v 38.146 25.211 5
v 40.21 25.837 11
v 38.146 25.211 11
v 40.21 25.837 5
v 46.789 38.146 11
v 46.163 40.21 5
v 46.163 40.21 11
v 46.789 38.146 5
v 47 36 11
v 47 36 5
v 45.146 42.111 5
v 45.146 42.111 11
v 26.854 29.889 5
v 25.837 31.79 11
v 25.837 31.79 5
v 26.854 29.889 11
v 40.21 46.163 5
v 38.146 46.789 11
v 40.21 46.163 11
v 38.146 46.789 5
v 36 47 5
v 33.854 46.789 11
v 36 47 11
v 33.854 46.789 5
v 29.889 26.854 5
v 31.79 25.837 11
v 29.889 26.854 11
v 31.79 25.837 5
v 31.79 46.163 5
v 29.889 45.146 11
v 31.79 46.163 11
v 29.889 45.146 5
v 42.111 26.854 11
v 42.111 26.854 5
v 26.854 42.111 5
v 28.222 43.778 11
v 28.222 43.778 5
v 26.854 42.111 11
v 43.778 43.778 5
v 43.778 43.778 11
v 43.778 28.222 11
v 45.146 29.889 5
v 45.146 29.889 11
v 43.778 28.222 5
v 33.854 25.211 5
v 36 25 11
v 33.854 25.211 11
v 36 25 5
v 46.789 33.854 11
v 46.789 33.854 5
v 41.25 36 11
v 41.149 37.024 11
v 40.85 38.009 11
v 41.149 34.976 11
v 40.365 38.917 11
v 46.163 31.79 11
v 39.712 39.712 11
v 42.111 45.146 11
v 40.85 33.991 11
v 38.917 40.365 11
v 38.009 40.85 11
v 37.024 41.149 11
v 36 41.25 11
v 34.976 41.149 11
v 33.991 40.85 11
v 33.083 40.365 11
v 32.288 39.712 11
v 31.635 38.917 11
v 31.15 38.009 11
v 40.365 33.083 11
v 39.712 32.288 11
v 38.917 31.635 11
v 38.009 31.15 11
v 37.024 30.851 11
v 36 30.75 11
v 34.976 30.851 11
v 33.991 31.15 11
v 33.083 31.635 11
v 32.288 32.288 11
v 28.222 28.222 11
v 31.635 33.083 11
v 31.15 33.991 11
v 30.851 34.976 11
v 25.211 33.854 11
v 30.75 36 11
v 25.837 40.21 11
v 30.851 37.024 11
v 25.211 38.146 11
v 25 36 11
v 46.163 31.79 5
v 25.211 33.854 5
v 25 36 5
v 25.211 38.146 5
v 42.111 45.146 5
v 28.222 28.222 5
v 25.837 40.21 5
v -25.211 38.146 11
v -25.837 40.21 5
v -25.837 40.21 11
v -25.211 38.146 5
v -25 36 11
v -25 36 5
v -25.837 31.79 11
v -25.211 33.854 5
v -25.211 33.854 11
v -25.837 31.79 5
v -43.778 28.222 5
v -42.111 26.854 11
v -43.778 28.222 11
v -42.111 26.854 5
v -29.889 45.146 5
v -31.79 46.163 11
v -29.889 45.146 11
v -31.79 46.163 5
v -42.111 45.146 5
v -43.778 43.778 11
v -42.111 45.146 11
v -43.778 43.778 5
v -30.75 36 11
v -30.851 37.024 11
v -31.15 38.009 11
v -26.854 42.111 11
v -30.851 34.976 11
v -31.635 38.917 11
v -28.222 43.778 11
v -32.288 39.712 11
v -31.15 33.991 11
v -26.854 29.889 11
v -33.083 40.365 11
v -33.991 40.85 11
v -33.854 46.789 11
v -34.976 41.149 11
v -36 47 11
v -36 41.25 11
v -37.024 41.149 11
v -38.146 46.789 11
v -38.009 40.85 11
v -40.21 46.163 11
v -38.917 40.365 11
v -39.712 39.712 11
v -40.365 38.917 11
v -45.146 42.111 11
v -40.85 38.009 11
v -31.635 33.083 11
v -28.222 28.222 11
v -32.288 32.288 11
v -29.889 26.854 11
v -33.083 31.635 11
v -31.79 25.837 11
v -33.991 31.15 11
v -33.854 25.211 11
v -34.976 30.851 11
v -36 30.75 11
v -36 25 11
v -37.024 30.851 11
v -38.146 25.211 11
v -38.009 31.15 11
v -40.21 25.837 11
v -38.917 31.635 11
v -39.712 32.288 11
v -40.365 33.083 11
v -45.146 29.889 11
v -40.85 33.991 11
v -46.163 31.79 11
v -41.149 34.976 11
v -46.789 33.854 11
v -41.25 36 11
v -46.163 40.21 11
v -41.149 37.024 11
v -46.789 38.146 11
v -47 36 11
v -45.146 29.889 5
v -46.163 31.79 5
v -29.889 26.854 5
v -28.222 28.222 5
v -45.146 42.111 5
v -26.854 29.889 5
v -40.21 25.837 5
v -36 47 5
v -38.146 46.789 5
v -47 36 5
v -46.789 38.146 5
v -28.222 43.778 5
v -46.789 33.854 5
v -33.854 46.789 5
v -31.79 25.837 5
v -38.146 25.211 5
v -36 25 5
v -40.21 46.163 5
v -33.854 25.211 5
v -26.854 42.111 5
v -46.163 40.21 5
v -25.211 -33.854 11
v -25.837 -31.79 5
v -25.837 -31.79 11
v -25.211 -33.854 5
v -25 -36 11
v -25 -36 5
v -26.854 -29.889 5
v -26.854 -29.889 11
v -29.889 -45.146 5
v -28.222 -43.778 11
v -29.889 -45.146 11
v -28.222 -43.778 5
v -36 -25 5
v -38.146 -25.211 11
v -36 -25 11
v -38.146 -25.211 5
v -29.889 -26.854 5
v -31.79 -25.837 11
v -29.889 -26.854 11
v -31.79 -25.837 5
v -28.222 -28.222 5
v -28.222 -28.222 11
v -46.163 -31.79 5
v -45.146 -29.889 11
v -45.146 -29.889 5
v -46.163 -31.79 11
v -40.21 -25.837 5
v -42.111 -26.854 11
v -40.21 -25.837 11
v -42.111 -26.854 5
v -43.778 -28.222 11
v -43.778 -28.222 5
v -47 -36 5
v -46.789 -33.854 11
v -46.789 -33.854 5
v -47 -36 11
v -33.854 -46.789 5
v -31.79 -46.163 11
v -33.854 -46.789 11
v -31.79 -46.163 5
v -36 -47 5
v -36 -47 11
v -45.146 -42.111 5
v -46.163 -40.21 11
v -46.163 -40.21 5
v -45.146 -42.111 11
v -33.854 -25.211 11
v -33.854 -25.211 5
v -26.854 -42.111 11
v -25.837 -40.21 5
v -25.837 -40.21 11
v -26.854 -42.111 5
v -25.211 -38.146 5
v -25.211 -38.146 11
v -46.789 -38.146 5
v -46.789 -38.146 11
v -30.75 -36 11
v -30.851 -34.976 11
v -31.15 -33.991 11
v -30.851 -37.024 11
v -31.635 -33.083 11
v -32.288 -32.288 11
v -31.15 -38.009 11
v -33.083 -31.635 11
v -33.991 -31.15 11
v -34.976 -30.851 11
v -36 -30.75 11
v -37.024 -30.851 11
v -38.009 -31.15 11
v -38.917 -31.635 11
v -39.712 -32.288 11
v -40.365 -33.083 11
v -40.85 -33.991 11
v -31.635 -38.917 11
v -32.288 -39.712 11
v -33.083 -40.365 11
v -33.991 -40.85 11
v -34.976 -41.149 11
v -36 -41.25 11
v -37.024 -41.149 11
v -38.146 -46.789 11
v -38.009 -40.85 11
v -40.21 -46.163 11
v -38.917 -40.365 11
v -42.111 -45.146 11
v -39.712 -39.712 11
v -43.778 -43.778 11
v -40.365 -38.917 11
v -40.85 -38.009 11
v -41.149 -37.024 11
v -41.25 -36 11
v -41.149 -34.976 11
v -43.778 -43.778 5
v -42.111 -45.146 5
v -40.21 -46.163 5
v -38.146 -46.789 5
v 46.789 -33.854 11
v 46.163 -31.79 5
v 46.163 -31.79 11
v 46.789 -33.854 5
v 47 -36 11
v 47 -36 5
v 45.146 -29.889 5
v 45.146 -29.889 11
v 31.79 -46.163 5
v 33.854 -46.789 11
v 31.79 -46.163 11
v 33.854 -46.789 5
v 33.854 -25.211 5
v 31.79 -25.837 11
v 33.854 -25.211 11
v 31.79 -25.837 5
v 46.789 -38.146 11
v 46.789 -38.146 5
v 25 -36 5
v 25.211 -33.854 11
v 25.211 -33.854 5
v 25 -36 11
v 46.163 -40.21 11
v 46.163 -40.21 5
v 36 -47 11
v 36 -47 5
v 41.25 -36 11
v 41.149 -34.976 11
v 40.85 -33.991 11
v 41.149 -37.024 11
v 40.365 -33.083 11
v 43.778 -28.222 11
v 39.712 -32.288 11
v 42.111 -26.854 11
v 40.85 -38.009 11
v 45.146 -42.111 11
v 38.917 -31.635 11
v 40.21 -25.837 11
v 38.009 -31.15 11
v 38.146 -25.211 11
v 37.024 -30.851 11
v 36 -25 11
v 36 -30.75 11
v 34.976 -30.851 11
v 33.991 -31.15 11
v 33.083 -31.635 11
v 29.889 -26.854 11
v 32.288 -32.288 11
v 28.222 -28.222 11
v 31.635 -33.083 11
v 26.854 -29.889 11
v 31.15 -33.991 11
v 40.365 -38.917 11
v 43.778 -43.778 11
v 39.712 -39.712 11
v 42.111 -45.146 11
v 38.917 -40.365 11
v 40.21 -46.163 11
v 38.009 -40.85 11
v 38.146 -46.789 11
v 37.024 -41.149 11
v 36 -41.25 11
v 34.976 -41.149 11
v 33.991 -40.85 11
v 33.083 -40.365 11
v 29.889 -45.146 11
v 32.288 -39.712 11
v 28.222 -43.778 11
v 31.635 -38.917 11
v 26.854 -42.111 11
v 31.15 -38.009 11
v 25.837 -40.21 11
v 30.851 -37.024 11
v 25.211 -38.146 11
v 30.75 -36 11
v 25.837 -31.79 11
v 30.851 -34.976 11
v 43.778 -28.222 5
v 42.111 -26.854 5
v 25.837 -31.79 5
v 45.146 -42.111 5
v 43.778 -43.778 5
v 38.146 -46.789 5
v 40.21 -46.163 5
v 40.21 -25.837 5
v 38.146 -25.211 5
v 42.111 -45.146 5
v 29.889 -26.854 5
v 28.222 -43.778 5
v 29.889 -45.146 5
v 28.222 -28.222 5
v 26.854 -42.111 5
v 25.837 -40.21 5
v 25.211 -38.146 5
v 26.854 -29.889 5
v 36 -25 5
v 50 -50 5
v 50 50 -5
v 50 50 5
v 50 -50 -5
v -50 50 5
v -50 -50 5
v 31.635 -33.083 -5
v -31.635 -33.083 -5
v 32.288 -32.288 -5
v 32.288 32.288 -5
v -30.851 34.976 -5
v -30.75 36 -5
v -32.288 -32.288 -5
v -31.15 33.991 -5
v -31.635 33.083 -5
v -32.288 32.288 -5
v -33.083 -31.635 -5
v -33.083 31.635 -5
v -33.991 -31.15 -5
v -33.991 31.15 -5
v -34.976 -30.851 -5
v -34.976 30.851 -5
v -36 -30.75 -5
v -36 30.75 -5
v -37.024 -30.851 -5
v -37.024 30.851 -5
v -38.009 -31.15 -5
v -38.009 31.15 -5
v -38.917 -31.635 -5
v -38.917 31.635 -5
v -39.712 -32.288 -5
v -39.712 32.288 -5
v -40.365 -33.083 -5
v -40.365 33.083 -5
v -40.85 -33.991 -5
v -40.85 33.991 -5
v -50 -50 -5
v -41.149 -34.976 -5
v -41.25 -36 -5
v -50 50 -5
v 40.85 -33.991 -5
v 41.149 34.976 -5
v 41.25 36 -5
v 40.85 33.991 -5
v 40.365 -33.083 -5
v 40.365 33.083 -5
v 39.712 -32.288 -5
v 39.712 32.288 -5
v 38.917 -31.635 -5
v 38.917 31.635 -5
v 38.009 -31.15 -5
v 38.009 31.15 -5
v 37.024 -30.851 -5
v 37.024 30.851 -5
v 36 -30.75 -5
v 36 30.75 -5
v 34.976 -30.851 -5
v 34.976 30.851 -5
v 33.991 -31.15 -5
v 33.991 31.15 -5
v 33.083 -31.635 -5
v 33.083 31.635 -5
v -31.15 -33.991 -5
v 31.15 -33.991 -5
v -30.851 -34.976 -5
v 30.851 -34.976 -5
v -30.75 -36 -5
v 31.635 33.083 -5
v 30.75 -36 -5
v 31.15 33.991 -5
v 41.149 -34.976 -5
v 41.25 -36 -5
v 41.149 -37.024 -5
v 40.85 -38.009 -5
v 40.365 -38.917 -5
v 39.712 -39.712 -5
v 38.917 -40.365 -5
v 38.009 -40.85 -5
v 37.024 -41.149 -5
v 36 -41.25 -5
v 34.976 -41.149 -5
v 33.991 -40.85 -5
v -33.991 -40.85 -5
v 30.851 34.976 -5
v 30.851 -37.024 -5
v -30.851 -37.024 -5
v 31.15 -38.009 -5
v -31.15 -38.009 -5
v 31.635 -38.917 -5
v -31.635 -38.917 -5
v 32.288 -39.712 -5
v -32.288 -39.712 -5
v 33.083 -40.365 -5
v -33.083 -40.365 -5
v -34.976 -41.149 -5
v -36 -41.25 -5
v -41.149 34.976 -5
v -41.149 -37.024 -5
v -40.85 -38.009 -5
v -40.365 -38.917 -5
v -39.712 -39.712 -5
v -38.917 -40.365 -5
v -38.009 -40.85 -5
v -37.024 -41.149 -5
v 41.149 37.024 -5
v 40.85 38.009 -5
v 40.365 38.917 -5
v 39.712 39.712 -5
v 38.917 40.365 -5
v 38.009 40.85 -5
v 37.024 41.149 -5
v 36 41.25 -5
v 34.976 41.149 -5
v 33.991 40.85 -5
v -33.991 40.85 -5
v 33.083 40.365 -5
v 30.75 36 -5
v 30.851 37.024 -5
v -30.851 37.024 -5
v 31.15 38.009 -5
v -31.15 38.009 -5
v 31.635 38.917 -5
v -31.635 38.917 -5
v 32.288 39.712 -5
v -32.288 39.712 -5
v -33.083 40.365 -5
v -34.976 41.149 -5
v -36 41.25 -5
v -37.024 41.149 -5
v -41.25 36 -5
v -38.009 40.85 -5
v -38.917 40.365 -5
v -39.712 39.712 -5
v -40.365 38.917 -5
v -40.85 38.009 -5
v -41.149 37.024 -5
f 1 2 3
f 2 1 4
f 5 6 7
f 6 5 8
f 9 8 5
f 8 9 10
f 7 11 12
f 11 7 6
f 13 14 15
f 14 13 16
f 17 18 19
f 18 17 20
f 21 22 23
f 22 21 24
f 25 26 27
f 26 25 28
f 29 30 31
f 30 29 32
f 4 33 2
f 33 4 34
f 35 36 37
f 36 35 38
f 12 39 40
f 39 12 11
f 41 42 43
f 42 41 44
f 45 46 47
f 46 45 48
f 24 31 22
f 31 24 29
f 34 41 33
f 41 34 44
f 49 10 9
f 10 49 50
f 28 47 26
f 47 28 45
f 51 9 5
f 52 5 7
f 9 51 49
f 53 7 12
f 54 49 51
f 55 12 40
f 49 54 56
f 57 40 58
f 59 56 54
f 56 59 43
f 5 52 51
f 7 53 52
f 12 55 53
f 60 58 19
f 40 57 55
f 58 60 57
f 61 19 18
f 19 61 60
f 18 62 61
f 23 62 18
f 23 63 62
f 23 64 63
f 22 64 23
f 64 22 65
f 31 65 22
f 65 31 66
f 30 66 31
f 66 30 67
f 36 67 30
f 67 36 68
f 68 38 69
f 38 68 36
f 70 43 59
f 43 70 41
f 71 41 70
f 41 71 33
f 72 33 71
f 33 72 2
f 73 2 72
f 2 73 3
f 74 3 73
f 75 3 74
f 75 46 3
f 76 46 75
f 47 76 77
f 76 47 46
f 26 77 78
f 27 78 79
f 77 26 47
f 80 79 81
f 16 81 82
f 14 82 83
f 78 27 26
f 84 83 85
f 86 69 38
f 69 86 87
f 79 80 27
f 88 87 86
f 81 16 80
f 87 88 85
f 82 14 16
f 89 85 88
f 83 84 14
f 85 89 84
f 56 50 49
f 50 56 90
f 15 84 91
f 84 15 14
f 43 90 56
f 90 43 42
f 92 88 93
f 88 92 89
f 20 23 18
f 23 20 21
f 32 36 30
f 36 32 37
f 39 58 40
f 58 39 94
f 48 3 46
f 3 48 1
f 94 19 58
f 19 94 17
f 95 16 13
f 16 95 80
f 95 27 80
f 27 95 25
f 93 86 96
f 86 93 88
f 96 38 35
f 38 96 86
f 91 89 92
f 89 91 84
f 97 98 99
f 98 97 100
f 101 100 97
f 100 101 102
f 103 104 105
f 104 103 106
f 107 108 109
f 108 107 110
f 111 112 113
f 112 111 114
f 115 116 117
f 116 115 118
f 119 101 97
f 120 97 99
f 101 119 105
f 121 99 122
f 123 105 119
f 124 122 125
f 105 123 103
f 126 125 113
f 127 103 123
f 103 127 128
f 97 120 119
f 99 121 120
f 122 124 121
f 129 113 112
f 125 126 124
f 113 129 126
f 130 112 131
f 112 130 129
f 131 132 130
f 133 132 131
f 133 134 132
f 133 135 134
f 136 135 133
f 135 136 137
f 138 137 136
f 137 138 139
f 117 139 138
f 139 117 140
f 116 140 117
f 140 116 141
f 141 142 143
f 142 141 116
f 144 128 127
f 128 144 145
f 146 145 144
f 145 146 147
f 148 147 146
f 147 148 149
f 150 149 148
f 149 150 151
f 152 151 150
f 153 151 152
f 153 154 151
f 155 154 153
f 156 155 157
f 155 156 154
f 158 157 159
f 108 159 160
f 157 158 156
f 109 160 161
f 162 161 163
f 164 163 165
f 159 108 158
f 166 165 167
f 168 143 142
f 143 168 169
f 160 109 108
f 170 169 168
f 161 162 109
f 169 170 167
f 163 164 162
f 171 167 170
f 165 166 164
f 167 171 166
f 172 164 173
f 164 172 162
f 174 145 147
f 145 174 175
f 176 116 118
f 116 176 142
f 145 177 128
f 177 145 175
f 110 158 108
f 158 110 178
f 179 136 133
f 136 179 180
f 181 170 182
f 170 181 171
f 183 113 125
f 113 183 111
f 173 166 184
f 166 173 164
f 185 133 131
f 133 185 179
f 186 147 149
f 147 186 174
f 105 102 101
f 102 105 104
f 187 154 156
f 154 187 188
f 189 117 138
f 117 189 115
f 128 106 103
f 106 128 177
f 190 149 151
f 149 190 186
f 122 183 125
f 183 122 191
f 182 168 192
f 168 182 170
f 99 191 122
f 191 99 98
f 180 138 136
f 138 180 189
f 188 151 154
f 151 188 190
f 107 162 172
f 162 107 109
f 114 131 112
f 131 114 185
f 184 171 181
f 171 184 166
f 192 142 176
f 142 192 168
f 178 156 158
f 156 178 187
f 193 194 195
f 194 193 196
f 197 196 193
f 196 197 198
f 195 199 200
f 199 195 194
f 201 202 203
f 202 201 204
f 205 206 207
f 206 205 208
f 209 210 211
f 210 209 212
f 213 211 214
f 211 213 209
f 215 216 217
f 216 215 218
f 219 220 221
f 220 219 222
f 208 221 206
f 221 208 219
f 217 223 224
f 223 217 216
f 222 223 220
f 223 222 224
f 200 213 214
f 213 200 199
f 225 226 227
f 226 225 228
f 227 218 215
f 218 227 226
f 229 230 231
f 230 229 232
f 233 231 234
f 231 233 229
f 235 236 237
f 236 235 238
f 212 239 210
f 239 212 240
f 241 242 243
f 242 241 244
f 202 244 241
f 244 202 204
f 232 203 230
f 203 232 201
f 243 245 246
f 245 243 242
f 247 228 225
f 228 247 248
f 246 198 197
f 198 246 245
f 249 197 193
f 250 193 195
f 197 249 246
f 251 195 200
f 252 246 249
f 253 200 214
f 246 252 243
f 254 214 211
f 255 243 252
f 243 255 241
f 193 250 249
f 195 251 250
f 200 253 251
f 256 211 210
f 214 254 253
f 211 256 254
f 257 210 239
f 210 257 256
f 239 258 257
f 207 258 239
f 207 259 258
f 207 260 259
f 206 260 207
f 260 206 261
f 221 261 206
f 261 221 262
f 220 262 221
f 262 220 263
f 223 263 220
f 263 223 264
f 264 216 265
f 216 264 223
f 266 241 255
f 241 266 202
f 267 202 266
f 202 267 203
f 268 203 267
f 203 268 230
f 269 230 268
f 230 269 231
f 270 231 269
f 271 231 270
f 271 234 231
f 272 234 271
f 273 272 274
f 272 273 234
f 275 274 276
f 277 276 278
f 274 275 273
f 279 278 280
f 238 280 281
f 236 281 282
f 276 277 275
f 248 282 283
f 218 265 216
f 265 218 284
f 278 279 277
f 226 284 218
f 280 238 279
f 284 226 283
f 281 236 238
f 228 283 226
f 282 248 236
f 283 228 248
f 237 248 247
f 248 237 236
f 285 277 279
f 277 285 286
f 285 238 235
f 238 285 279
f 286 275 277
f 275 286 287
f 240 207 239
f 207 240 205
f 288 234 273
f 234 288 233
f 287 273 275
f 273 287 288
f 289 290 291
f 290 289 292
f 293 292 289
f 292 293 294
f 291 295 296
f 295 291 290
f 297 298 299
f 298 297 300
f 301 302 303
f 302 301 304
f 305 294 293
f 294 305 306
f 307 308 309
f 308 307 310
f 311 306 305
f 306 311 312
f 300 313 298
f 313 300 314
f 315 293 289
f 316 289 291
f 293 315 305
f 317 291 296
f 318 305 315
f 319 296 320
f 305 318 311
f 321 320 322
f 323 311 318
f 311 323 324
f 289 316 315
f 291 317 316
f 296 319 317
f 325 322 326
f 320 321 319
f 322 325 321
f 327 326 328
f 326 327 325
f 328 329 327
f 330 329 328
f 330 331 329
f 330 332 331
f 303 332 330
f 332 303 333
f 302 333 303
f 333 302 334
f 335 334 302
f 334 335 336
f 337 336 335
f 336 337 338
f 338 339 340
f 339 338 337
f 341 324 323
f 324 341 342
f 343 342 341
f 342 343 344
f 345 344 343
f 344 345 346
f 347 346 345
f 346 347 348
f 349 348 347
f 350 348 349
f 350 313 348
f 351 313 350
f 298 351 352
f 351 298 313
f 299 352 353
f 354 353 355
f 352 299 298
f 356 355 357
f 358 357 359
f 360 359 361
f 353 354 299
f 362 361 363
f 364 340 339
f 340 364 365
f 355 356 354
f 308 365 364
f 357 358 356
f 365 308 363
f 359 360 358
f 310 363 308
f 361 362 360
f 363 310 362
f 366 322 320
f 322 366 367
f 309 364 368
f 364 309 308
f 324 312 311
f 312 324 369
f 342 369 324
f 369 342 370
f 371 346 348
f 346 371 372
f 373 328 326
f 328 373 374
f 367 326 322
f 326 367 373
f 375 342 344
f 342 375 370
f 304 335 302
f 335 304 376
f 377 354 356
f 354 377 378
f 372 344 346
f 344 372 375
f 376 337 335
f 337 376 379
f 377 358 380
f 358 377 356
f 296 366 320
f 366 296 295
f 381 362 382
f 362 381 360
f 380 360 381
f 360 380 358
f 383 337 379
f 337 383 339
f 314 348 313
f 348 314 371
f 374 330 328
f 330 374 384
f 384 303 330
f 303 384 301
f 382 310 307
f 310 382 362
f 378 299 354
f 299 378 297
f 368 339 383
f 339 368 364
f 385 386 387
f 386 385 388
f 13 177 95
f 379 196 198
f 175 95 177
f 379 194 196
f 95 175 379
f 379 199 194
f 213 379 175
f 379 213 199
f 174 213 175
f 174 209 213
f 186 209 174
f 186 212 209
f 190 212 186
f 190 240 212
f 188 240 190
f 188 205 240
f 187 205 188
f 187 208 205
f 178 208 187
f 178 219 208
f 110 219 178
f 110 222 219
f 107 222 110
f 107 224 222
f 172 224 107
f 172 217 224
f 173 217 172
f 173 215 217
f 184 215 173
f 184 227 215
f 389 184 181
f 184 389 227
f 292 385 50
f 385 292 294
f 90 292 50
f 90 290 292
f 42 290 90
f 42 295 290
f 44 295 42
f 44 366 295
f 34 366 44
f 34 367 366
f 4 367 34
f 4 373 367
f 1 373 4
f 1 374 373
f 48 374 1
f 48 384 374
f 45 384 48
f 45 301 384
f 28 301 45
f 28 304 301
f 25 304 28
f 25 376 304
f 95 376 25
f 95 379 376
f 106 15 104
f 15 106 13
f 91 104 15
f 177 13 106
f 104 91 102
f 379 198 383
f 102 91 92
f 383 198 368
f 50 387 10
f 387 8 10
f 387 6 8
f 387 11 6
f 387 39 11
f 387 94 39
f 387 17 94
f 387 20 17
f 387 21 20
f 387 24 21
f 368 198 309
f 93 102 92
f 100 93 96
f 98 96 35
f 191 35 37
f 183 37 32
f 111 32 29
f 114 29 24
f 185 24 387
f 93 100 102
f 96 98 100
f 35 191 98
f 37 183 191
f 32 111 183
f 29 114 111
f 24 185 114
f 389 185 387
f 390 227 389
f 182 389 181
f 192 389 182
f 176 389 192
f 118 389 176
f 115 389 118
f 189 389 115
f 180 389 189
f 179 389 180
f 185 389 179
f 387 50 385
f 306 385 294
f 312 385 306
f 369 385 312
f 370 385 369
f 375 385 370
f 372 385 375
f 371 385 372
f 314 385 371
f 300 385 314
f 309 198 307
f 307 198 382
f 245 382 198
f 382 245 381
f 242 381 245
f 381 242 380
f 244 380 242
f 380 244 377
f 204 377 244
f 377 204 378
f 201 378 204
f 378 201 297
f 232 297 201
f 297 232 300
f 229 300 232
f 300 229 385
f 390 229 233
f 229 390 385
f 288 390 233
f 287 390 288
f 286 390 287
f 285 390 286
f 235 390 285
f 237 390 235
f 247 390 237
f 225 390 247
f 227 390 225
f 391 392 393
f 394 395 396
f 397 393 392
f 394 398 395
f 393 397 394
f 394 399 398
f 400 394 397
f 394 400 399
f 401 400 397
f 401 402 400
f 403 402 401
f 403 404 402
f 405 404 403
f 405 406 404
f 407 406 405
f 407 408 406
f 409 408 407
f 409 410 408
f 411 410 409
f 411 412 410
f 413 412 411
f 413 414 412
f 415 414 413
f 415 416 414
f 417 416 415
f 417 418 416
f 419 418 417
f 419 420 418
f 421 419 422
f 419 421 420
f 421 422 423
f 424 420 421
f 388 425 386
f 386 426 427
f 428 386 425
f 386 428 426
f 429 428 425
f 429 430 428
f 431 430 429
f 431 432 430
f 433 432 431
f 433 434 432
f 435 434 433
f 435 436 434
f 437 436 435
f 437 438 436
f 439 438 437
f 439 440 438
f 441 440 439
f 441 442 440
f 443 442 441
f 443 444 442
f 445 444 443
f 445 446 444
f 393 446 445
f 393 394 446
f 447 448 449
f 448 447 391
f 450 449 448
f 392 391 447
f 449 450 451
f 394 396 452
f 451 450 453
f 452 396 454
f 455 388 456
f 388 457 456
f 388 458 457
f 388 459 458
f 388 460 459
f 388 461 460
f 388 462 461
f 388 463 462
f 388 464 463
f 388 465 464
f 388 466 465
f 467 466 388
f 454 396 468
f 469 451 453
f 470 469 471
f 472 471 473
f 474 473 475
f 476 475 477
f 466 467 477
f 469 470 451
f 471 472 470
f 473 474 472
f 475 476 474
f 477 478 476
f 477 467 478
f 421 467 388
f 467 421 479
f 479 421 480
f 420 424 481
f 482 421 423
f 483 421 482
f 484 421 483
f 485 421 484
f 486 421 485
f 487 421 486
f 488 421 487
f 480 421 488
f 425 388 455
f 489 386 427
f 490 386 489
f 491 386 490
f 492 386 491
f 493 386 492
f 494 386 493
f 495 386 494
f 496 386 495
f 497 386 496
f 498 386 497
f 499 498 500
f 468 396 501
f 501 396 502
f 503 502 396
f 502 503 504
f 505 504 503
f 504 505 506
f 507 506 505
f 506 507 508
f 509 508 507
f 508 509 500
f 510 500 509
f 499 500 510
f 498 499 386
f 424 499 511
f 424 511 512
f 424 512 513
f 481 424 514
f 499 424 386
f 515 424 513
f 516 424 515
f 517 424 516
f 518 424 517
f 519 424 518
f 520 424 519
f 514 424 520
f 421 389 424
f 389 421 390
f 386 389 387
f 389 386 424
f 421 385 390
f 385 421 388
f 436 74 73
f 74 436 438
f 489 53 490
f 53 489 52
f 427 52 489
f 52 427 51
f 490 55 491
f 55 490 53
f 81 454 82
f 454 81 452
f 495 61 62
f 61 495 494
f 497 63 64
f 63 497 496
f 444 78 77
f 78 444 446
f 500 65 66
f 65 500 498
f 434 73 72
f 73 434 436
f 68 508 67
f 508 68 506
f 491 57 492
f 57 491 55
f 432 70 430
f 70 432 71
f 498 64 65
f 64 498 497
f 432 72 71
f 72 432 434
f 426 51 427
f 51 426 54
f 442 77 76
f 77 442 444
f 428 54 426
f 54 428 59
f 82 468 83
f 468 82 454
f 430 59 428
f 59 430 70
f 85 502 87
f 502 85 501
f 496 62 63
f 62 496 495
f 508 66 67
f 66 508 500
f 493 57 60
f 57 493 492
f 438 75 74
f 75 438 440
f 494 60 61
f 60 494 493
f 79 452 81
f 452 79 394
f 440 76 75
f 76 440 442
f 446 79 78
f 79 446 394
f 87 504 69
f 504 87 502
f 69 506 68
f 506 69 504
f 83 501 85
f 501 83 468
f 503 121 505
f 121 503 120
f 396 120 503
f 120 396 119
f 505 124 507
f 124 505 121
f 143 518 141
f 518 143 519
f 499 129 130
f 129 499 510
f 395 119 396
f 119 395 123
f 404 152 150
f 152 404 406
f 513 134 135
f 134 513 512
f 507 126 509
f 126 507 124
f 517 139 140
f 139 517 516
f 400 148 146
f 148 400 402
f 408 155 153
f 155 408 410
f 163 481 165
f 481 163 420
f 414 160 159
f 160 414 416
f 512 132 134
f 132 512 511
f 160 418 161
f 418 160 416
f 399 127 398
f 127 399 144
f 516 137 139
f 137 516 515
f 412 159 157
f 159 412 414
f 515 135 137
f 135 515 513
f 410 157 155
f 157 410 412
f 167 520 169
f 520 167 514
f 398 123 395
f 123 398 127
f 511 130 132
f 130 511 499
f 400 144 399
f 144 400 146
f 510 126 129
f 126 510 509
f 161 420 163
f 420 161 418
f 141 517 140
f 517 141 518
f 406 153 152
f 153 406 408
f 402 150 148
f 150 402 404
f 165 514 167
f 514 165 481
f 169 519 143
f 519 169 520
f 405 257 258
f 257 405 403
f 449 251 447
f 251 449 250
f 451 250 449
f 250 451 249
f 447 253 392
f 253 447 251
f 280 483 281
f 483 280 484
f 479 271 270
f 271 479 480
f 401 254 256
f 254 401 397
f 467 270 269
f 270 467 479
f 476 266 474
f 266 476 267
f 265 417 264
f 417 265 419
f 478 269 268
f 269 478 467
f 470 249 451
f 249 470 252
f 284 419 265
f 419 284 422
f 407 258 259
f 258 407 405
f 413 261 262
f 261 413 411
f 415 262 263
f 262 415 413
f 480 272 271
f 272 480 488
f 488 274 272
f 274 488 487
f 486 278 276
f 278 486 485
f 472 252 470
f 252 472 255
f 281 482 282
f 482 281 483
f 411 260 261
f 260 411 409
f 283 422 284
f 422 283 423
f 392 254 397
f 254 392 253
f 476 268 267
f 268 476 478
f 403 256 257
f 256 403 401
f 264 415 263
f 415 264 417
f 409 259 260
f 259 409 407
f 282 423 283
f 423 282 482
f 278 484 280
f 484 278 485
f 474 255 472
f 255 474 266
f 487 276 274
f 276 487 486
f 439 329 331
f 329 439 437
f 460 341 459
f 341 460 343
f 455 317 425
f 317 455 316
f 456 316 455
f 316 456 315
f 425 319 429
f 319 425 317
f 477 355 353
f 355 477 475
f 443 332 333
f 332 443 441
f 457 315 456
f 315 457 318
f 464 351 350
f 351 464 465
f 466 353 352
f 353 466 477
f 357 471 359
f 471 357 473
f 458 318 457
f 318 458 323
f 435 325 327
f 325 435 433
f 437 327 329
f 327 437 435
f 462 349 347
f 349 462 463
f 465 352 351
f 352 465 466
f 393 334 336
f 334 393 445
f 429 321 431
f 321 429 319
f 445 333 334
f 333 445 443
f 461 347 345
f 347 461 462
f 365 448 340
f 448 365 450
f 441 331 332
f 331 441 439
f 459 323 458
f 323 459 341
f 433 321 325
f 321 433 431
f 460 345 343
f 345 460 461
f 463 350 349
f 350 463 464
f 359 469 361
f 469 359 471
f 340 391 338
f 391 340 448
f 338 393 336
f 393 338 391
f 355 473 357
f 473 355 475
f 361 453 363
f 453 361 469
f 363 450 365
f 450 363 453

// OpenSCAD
$fn = 32;

// ----------------------------------------------------------------------
// Anchor pads 100 x 100 x 16
// four corner bosses with anchor holes
// ----------------------------------------------------------------------

// --- parameters (mm) ---
plate = [100, 100, 10];  // base plate size (x, y, z)
pads = 4;                // boss count, one per corner
edge = 14;               // boss centre offset from the plate edge
boss_d = 22;             // boss diameter
boss_h = 6;              // boss height above the base plate
hole_d = 10.5;           // hole diameter

// --- derived feature positions (mm) ---
height = plate[2] + boss_h;      // = 16   overall height of the part
corner_x = plate[0] / 2 - edge;  // = 36   boss centre X
corner_y = plate[1] / 2 - edge;  // = 36   boss centre Y
feature_centers = [
  [corner_x, corner_y],
  [-corner_x, corner_y],
  [-corner_x, -corner_y],
  [corner_x, -corner_y]
];   // boss centres, anchor holes are drilled there

// base plate, four bosses standing on it, anchor holes all the way through
difference() {
  union() {
    cube(plate, center = true);
    for (centre = feature_centers)
      translate([centre[0], centre[1], plate[2] / 2 - 1])
        cylinder(d = boss_d, h = boss_h + 1);
  }
  for (centre = feature_centers)
    translate([centre[0], centre[1], -height])
      cylinder(d = hole_d, h = 2 * height + 2);  // through boss and plate
}
